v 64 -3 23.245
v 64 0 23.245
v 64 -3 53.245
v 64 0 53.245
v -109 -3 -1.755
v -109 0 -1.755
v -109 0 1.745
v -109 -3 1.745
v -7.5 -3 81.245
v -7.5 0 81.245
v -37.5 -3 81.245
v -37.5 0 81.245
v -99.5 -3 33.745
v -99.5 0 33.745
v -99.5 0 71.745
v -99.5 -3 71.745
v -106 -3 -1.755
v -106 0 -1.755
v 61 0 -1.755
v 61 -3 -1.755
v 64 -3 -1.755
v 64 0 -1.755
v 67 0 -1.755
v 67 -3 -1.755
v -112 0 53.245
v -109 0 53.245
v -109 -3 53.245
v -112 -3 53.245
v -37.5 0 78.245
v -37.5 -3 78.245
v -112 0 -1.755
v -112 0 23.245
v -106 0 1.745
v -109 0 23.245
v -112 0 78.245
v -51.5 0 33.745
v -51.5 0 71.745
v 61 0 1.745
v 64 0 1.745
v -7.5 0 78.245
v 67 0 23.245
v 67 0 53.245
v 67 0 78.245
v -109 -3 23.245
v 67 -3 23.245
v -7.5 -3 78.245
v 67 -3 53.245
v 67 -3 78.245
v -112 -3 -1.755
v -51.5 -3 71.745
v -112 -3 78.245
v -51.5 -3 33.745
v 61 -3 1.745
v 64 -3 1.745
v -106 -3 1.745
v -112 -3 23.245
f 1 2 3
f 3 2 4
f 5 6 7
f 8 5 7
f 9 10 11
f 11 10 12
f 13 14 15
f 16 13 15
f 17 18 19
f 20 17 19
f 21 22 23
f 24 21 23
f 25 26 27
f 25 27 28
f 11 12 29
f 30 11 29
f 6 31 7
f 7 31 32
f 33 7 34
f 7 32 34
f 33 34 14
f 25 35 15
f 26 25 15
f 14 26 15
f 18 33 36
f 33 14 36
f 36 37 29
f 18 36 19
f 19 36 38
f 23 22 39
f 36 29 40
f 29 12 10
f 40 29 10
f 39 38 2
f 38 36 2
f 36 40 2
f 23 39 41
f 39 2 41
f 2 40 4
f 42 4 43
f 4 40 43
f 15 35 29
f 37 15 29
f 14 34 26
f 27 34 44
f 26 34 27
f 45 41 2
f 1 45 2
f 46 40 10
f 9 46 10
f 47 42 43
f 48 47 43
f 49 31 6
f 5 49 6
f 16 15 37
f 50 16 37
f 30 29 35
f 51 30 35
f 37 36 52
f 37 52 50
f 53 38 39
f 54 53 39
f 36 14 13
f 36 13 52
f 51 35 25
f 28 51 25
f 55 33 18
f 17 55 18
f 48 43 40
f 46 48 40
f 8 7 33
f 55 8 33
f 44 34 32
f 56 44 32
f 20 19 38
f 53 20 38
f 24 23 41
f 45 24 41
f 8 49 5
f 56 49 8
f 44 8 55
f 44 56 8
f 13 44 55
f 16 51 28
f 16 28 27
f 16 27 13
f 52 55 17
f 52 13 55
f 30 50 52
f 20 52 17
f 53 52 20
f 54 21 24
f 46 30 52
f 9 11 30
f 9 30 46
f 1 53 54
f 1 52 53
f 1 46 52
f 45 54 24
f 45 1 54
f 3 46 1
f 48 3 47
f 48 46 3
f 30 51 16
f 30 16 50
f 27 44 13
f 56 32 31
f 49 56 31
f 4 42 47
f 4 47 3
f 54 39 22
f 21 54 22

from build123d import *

# Parameters (mm, degrees)
F0_W     = 48
F0_H     = 38
F1_DEPTH = 3
F2_W     = 3
F2_H     = 30
F3_DEPTH = 25


with BuildPart() as f1:
    # F0 (on Front) → F1 (new body)
    with BuildSketch(Plane.XZ):
        Polygon((-37.5, 78.245069), (-112, 78.245069), (-112, -1.754931), (-109, -1.754931), (-109, 1.745069), (-106, 1.745069), (-106, -1.754931), (61, -1.754931), (61, 1.745069), (64, 1.745069), (64, -1.754931), (67, -1.754931), (67, 78.245069), (-7.5, 78.245069), (-7.5, 81.245069), (-37.5, 81.245069), align=None)
        with Locations((-75.5, 52.745069)):
            Rectangle(F0_W, F0_H, mode=Mode.SUBTRACT)
    extrude(amount=F1_DEPTH)

    # F2 (on face) → F3 (cut)
    with BuildSketch(Plane(origin=(0, 0, 0), x_dir=(-1, 0, 0), z_dir=(0, 1, 0))):
        with Locations((-65.5, 38.245069)):
            Rectangle(F2_W, F2_H)
        with Locations((110.5, 38.245069)):
            Rectangle(F2_W, F2_H)
    extrude(amount=-F3_DEPTH, mode=Mode.SUBTRACT)


solid = f1.part
